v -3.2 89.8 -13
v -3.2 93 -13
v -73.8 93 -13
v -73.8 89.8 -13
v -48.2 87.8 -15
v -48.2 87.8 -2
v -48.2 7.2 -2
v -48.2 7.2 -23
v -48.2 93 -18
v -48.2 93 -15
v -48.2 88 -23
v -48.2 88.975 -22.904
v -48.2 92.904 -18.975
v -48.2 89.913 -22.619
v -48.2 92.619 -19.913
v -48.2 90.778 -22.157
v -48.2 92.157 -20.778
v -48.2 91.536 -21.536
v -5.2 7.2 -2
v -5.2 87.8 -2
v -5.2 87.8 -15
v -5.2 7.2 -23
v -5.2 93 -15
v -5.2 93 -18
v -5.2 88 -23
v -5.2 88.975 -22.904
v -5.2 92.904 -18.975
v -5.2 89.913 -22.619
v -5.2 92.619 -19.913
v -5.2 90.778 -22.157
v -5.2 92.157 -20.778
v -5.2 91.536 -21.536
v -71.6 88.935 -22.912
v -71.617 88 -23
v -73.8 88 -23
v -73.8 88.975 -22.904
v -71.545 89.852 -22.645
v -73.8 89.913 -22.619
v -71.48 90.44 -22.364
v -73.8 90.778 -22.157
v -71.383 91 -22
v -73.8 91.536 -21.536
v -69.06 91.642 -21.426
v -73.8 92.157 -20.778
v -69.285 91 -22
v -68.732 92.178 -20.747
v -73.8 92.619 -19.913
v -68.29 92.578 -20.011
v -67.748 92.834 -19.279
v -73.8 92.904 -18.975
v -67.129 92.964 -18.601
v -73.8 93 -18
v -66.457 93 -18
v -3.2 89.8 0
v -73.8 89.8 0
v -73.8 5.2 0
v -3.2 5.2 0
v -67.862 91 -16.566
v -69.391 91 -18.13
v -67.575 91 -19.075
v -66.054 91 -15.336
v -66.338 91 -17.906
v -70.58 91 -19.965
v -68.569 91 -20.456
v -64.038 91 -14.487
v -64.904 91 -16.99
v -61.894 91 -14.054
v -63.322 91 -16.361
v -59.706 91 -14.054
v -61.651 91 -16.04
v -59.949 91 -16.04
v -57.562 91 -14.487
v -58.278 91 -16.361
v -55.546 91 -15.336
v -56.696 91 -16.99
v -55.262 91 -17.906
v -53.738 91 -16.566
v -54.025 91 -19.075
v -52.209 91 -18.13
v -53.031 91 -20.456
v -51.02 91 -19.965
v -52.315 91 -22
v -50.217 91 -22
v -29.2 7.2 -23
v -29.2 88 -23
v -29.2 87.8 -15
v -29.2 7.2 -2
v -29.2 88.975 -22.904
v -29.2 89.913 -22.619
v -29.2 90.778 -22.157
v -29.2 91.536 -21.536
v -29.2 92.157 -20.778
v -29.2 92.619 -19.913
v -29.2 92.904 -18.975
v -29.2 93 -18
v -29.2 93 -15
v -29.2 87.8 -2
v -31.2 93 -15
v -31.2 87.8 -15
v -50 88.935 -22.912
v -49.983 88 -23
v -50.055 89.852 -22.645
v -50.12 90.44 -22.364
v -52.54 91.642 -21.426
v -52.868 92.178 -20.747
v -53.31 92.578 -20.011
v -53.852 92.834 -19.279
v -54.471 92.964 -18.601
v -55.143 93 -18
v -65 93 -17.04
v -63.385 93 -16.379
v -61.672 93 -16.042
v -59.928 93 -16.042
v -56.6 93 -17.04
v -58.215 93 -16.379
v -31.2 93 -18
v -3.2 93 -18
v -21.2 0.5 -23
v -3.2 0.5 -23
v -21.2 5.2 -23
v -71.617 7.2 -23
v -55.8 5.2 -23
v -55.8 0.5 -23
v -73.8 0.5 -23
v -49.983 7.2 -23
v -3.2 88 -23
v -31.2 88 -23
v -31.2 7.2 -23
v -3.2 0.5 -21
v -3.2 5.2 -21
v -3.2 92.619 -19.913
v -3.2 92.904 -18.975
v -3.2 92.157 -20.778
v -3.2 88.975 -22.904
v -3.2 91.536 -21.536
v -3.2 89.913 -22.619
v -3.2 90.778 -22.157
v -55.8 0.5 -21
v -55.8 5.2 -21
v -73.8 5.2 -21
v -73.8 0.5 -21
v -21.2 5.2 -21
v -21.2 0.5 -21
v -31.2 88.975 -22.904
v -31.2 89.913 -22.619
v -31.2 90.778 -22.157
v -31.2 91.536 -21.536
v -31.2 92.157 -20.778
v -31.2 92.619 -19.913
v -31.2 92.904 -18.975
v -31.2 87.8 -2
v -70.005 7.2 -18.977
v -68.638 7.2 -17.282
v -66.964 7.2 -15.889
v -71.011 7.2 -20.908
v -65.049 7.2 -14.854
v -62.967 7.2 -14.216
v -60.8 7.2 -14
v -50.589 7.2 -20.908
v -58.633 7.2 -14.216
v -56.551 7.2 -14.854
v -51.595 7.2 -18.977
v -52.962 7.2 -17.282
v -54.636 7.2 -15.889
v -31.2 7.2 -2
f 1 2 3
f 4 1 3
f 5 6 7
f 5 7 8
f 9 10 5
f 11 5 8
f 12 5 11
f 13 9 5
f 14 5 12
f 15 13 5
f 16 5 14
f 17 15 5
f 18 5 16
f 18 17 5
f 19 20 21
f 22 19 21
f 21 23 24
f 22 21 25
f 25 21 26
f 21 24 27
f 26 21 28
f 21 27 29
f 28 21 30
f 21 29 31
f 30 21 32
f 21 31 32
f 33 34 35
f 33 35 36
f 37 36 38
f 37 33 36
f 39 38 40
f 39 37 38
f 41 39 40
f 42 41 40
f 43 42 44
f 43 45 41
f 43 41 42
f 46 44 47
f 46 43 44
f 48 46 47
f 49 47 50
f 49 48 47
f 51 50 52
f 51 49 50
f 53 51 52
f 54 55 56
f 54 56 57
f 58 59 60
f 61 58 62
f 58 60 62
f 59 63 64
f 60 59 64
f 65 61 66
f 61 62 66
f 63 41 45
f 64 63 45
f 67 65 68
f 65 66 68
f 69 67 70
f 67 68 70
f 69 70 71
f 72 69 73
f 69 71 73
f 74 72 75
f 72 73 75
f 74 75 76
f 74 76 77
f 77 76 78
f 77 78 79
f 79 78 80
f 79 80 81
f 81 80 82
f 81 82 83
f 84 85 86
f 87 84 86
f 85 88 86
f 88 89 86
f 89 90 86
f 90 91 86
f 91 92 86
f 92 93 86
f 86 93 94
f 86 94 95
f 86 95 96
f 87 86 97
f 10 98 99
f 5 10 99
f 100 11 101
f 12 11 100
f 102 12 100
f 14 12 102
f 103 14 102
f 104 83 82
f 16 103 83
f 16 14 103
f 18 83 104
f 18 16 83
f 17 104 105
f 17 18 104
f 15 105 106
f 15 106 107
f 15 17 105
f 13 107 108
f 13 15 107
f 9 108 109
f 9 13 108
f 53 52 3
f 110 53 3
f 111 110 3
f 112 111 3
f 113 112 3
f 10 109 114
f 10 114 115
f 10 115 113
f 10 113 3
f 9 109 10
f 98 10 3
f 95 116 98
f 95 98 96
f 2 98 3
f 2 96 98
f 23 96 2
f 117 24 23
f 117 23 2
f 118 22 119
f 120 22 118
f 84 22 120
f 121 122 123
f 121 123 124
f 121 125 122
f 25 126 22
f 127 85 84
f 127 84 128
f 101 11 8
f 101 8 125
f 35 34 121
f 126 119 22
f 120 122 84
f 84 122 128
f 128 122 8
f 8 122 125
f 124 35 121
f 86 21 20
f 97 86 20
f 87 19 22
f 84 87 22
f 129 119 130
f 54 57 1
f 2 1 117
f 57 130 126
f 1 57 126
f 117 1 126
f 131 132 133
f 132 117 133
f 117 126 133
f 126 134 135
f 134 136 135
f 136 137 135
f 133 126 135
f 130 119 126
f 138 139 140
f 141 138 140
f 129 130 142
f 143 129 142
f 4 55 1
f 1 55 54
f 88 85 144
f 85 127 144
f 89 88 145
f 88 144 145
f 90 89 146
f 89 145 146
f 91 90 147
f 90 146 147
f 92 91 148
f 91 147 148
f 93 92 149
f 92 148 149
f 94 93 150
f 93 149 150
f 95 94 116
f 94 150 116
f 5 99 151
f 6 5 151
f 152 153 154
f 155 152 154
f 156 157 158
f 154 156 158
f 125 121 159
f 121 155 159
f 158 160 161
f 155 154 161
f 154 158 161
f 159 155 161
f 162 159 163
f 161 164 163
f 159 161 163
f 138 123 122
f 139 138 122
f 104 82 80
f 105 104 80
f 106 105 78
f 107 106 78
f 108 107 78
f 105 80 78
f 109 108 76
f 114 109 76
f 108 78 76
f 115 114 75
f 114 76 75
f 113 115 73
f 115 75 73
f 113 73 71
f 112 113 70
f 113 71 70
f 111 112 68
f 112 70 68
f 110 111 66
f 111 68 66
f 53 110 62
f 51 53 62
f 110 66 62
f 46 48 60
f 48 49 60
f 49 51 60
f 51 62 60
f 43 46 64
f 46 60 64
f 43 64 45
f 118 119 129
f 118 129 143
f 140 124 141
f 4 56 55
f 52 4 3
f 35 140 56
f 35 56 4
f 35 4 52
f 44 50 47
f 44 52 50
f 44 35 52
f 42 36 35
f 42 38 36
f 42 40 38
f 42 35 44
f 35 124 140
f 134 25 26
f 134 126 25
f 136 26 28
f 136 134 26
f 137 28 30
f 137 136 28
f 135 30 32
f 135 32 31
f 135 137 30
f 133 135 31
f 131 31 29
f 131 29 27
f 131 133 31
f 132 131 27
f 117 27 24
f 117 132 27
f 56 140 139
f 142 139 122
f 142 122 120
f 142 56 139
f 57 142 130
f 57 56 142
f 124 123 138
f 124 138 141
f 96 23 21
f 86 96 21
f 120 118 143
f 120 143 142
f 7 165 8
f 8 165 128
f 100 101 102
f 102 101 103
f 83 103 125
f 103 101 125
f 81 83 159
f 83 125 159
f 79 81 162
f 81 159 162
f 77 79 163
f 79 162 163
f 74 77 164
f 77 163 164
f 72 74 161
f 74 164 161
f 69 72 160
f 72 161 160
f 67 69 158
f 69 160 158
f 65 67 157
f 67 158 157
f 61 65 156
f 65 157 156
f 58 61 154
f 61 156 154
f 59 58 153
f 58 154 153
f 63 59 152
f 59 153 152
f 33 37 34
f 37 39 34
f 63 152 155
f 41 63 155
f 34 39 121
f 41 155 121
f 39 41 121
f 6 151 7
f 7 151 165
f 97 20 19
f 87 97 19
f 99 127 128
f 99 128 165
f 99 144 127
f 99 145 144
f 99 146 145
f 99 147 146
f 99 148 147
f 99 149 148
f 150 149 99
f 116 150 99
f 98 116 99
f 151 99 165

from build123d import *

# Parameters (mm, degrees)
SKETCH_1_W          = 70.6
SKETCH_1_H          = 84.6
EXTRUDE_1_DEPTH     = 23
SKETCH_2_W          = 18
SKETCH_2_H          = 4.7
EXTRUDE_2_DEPTH     = 2
SKETCH_3_W          = 70.6
SKETCH_3_H          = 3.2
EXTRUDE_5_DEPTH     = 10
CUT_EXTRUDE_START   = -2
SKETCH_4_R          = 11
CUT_EXTRUDE_1_DEPTH = 115.979827321
EXTRUDE_START       = -2
EXTRUDE_1_2_DEPTH   = 2
DELETE_START        = 91
DELETE_FACE_1_DEPTH = 2
CUT_EXTRUDE_2_DEPTH = 43
EXTRUDE_START_2     = 24
EXTRUDE_6_DEPTH     = 2
FILLET_1_R          = 5


# Read off the part's stored shape, not the designer's step: 删除面1
with BuildPart() as part:
    # 草图1 → Extrude 1 (new body)
    with BuildSketch(Plane.XY):
        with Locations((-38.5, 47.5)):
            Rectangle(SKETCH_1_W, SKETCH_1_H)
    extrude(amount=-EXTRUDE_1_DEPTH)

    # 草图2 → 凸台-拉伸2 (add)
    with BuildSketch(Plane(origin=(0, 0, -23), x_dir=(-1, 0, 0), z_dir=(0, 0, -1))):
        with Locations((12.2, 2.85)):
            Rectangle(SKETCH_2_W, SKETCH_2_H)
        with Locations((64.8, 2.85)):
            Rectangle(SKETCH_2_W, SKETCH_2_H)
    extrude(amount=-EXTRUDE_2_DEPTH)

    # 草图3 → 凸台-拉伸5 (add)
    with BuildSketch(Plane(origin=(0, 0, -23), x_dir=(-1, 0, 0), z_dir=(0, 0, -1))):
        with Locations((38.5, 91.4)):
            Rectangle(SKETCH_3_W, SKETCH_3_H)
    extrude(amount=-EXTRUDE_5_DEPTH)

    # 草图4 → 切除-拉伸1 (cut, through all)
    with BuildSketch(Plane.XZ.offset(-5.2).offset(CUT_EXTRUDE_START)):
        with Locations((-60.8, -25)):
            Circle(SKETCH_4_R)
    extrude(amount=-CUT_EXTRUDE_1_DEPTH, mode=Mode.SUBTRACT)

    # 草图5 → Extrude 1 2 (add)
    with BuildSketch(Plane(origin=(0, 93, 0), x_dir=(1, 0, 0), z_dir=(0, 1, 0)).offset(EXTRUDE_START)):
        with BuildLine():
            ThreePointArc((-71.616653826, 23), (-60.8, 14), (-49.983346174, 23))
            Line((-49.983346174, 23), (-51.950010506, 23.363636364))
            ThreePointArc((-51.950010506, 23.363636364), (-60.8, 16), (-69.649989494, 23.363636364))
            Line((-69.649989494, 23.363636364), (-71.616653826, 23))
        make_face()
    extrude(amount=EXTRUDE_1_2_DEPTH)

    # Delete Face 1 outline → Delete Face 1 (cut)
    with BuildSketch(Plane(origin=(0, 0, 0), x_dir=(1, 0, 0), z_dir=(0, 1, 0)).offset(DELETE_START)):
        with BuildLine():
            ThreePointArc((-51.950010506, 23.363636364), (-51.985647631, 23.181431245), (-52.025035613, 23))
            Line((-52.025035613, 23), (-49.983346174, 23))
            Line((-49.983346174, 23), (-51.950010506, 23.363636364))
        make_face()
        with BuildLine():
            Line((-69.649989494, 23.363636364), (-71.616653826, 23))
            Line((-71.616653826, 23), (-69.574964387, 23))
            ThreePointArc((-69.574964387, 23), (-69.614352369, 23.181431245), (-69.649989494, 23.363636364))
        make_face()
    extrude(amount=DELETE_FACE_1_DEPTH, mode=Mode.SUBTRACT)

    # 草图6 → 切除-拉伸2 (cut)
    with BuildSketch(Plane(origin=(-3.2, 0, 0), x_dir=(0, 0, -1), z_dir=(1, 0, 0)).offset(CUT_EXTRUDE_START)):
        Polygon((23, 93), (15, 93), (15, 87.8), (2, 87.8), (2, 7.2), (23, 7.2), align=None)
    extrude(amount=-CUT_EXTRUDE_2_DEPTH, mode=Mode.SUBTRACT)

    # 草图7 → 凸台-拉伸6 (add)
    with BuildSketch(Plane.ZY.offset(5.2).offset(EXTRUDE_START_2)):
        Polygon((-23, 93), (-23, 7.2), (-2, 7.2), (-2, 87.8), (-15, 87.8), (-15, 93), align=None)
    extrude(amount=EXTRUDE_6_DEPTH)

    # 圆角1
    fillet_1_edges = [part.edges().sort_by_distance(p)[0] for p in [
        (-71.687482193, 93, -23),
        (-50.112517807, 93, -23),
        (-30.2, 93, -23),
        (-4.2, 93, -23),
    ]]
    fillet(fillet_1_edges, radius=FILLET_1_R)


solid = part.part
